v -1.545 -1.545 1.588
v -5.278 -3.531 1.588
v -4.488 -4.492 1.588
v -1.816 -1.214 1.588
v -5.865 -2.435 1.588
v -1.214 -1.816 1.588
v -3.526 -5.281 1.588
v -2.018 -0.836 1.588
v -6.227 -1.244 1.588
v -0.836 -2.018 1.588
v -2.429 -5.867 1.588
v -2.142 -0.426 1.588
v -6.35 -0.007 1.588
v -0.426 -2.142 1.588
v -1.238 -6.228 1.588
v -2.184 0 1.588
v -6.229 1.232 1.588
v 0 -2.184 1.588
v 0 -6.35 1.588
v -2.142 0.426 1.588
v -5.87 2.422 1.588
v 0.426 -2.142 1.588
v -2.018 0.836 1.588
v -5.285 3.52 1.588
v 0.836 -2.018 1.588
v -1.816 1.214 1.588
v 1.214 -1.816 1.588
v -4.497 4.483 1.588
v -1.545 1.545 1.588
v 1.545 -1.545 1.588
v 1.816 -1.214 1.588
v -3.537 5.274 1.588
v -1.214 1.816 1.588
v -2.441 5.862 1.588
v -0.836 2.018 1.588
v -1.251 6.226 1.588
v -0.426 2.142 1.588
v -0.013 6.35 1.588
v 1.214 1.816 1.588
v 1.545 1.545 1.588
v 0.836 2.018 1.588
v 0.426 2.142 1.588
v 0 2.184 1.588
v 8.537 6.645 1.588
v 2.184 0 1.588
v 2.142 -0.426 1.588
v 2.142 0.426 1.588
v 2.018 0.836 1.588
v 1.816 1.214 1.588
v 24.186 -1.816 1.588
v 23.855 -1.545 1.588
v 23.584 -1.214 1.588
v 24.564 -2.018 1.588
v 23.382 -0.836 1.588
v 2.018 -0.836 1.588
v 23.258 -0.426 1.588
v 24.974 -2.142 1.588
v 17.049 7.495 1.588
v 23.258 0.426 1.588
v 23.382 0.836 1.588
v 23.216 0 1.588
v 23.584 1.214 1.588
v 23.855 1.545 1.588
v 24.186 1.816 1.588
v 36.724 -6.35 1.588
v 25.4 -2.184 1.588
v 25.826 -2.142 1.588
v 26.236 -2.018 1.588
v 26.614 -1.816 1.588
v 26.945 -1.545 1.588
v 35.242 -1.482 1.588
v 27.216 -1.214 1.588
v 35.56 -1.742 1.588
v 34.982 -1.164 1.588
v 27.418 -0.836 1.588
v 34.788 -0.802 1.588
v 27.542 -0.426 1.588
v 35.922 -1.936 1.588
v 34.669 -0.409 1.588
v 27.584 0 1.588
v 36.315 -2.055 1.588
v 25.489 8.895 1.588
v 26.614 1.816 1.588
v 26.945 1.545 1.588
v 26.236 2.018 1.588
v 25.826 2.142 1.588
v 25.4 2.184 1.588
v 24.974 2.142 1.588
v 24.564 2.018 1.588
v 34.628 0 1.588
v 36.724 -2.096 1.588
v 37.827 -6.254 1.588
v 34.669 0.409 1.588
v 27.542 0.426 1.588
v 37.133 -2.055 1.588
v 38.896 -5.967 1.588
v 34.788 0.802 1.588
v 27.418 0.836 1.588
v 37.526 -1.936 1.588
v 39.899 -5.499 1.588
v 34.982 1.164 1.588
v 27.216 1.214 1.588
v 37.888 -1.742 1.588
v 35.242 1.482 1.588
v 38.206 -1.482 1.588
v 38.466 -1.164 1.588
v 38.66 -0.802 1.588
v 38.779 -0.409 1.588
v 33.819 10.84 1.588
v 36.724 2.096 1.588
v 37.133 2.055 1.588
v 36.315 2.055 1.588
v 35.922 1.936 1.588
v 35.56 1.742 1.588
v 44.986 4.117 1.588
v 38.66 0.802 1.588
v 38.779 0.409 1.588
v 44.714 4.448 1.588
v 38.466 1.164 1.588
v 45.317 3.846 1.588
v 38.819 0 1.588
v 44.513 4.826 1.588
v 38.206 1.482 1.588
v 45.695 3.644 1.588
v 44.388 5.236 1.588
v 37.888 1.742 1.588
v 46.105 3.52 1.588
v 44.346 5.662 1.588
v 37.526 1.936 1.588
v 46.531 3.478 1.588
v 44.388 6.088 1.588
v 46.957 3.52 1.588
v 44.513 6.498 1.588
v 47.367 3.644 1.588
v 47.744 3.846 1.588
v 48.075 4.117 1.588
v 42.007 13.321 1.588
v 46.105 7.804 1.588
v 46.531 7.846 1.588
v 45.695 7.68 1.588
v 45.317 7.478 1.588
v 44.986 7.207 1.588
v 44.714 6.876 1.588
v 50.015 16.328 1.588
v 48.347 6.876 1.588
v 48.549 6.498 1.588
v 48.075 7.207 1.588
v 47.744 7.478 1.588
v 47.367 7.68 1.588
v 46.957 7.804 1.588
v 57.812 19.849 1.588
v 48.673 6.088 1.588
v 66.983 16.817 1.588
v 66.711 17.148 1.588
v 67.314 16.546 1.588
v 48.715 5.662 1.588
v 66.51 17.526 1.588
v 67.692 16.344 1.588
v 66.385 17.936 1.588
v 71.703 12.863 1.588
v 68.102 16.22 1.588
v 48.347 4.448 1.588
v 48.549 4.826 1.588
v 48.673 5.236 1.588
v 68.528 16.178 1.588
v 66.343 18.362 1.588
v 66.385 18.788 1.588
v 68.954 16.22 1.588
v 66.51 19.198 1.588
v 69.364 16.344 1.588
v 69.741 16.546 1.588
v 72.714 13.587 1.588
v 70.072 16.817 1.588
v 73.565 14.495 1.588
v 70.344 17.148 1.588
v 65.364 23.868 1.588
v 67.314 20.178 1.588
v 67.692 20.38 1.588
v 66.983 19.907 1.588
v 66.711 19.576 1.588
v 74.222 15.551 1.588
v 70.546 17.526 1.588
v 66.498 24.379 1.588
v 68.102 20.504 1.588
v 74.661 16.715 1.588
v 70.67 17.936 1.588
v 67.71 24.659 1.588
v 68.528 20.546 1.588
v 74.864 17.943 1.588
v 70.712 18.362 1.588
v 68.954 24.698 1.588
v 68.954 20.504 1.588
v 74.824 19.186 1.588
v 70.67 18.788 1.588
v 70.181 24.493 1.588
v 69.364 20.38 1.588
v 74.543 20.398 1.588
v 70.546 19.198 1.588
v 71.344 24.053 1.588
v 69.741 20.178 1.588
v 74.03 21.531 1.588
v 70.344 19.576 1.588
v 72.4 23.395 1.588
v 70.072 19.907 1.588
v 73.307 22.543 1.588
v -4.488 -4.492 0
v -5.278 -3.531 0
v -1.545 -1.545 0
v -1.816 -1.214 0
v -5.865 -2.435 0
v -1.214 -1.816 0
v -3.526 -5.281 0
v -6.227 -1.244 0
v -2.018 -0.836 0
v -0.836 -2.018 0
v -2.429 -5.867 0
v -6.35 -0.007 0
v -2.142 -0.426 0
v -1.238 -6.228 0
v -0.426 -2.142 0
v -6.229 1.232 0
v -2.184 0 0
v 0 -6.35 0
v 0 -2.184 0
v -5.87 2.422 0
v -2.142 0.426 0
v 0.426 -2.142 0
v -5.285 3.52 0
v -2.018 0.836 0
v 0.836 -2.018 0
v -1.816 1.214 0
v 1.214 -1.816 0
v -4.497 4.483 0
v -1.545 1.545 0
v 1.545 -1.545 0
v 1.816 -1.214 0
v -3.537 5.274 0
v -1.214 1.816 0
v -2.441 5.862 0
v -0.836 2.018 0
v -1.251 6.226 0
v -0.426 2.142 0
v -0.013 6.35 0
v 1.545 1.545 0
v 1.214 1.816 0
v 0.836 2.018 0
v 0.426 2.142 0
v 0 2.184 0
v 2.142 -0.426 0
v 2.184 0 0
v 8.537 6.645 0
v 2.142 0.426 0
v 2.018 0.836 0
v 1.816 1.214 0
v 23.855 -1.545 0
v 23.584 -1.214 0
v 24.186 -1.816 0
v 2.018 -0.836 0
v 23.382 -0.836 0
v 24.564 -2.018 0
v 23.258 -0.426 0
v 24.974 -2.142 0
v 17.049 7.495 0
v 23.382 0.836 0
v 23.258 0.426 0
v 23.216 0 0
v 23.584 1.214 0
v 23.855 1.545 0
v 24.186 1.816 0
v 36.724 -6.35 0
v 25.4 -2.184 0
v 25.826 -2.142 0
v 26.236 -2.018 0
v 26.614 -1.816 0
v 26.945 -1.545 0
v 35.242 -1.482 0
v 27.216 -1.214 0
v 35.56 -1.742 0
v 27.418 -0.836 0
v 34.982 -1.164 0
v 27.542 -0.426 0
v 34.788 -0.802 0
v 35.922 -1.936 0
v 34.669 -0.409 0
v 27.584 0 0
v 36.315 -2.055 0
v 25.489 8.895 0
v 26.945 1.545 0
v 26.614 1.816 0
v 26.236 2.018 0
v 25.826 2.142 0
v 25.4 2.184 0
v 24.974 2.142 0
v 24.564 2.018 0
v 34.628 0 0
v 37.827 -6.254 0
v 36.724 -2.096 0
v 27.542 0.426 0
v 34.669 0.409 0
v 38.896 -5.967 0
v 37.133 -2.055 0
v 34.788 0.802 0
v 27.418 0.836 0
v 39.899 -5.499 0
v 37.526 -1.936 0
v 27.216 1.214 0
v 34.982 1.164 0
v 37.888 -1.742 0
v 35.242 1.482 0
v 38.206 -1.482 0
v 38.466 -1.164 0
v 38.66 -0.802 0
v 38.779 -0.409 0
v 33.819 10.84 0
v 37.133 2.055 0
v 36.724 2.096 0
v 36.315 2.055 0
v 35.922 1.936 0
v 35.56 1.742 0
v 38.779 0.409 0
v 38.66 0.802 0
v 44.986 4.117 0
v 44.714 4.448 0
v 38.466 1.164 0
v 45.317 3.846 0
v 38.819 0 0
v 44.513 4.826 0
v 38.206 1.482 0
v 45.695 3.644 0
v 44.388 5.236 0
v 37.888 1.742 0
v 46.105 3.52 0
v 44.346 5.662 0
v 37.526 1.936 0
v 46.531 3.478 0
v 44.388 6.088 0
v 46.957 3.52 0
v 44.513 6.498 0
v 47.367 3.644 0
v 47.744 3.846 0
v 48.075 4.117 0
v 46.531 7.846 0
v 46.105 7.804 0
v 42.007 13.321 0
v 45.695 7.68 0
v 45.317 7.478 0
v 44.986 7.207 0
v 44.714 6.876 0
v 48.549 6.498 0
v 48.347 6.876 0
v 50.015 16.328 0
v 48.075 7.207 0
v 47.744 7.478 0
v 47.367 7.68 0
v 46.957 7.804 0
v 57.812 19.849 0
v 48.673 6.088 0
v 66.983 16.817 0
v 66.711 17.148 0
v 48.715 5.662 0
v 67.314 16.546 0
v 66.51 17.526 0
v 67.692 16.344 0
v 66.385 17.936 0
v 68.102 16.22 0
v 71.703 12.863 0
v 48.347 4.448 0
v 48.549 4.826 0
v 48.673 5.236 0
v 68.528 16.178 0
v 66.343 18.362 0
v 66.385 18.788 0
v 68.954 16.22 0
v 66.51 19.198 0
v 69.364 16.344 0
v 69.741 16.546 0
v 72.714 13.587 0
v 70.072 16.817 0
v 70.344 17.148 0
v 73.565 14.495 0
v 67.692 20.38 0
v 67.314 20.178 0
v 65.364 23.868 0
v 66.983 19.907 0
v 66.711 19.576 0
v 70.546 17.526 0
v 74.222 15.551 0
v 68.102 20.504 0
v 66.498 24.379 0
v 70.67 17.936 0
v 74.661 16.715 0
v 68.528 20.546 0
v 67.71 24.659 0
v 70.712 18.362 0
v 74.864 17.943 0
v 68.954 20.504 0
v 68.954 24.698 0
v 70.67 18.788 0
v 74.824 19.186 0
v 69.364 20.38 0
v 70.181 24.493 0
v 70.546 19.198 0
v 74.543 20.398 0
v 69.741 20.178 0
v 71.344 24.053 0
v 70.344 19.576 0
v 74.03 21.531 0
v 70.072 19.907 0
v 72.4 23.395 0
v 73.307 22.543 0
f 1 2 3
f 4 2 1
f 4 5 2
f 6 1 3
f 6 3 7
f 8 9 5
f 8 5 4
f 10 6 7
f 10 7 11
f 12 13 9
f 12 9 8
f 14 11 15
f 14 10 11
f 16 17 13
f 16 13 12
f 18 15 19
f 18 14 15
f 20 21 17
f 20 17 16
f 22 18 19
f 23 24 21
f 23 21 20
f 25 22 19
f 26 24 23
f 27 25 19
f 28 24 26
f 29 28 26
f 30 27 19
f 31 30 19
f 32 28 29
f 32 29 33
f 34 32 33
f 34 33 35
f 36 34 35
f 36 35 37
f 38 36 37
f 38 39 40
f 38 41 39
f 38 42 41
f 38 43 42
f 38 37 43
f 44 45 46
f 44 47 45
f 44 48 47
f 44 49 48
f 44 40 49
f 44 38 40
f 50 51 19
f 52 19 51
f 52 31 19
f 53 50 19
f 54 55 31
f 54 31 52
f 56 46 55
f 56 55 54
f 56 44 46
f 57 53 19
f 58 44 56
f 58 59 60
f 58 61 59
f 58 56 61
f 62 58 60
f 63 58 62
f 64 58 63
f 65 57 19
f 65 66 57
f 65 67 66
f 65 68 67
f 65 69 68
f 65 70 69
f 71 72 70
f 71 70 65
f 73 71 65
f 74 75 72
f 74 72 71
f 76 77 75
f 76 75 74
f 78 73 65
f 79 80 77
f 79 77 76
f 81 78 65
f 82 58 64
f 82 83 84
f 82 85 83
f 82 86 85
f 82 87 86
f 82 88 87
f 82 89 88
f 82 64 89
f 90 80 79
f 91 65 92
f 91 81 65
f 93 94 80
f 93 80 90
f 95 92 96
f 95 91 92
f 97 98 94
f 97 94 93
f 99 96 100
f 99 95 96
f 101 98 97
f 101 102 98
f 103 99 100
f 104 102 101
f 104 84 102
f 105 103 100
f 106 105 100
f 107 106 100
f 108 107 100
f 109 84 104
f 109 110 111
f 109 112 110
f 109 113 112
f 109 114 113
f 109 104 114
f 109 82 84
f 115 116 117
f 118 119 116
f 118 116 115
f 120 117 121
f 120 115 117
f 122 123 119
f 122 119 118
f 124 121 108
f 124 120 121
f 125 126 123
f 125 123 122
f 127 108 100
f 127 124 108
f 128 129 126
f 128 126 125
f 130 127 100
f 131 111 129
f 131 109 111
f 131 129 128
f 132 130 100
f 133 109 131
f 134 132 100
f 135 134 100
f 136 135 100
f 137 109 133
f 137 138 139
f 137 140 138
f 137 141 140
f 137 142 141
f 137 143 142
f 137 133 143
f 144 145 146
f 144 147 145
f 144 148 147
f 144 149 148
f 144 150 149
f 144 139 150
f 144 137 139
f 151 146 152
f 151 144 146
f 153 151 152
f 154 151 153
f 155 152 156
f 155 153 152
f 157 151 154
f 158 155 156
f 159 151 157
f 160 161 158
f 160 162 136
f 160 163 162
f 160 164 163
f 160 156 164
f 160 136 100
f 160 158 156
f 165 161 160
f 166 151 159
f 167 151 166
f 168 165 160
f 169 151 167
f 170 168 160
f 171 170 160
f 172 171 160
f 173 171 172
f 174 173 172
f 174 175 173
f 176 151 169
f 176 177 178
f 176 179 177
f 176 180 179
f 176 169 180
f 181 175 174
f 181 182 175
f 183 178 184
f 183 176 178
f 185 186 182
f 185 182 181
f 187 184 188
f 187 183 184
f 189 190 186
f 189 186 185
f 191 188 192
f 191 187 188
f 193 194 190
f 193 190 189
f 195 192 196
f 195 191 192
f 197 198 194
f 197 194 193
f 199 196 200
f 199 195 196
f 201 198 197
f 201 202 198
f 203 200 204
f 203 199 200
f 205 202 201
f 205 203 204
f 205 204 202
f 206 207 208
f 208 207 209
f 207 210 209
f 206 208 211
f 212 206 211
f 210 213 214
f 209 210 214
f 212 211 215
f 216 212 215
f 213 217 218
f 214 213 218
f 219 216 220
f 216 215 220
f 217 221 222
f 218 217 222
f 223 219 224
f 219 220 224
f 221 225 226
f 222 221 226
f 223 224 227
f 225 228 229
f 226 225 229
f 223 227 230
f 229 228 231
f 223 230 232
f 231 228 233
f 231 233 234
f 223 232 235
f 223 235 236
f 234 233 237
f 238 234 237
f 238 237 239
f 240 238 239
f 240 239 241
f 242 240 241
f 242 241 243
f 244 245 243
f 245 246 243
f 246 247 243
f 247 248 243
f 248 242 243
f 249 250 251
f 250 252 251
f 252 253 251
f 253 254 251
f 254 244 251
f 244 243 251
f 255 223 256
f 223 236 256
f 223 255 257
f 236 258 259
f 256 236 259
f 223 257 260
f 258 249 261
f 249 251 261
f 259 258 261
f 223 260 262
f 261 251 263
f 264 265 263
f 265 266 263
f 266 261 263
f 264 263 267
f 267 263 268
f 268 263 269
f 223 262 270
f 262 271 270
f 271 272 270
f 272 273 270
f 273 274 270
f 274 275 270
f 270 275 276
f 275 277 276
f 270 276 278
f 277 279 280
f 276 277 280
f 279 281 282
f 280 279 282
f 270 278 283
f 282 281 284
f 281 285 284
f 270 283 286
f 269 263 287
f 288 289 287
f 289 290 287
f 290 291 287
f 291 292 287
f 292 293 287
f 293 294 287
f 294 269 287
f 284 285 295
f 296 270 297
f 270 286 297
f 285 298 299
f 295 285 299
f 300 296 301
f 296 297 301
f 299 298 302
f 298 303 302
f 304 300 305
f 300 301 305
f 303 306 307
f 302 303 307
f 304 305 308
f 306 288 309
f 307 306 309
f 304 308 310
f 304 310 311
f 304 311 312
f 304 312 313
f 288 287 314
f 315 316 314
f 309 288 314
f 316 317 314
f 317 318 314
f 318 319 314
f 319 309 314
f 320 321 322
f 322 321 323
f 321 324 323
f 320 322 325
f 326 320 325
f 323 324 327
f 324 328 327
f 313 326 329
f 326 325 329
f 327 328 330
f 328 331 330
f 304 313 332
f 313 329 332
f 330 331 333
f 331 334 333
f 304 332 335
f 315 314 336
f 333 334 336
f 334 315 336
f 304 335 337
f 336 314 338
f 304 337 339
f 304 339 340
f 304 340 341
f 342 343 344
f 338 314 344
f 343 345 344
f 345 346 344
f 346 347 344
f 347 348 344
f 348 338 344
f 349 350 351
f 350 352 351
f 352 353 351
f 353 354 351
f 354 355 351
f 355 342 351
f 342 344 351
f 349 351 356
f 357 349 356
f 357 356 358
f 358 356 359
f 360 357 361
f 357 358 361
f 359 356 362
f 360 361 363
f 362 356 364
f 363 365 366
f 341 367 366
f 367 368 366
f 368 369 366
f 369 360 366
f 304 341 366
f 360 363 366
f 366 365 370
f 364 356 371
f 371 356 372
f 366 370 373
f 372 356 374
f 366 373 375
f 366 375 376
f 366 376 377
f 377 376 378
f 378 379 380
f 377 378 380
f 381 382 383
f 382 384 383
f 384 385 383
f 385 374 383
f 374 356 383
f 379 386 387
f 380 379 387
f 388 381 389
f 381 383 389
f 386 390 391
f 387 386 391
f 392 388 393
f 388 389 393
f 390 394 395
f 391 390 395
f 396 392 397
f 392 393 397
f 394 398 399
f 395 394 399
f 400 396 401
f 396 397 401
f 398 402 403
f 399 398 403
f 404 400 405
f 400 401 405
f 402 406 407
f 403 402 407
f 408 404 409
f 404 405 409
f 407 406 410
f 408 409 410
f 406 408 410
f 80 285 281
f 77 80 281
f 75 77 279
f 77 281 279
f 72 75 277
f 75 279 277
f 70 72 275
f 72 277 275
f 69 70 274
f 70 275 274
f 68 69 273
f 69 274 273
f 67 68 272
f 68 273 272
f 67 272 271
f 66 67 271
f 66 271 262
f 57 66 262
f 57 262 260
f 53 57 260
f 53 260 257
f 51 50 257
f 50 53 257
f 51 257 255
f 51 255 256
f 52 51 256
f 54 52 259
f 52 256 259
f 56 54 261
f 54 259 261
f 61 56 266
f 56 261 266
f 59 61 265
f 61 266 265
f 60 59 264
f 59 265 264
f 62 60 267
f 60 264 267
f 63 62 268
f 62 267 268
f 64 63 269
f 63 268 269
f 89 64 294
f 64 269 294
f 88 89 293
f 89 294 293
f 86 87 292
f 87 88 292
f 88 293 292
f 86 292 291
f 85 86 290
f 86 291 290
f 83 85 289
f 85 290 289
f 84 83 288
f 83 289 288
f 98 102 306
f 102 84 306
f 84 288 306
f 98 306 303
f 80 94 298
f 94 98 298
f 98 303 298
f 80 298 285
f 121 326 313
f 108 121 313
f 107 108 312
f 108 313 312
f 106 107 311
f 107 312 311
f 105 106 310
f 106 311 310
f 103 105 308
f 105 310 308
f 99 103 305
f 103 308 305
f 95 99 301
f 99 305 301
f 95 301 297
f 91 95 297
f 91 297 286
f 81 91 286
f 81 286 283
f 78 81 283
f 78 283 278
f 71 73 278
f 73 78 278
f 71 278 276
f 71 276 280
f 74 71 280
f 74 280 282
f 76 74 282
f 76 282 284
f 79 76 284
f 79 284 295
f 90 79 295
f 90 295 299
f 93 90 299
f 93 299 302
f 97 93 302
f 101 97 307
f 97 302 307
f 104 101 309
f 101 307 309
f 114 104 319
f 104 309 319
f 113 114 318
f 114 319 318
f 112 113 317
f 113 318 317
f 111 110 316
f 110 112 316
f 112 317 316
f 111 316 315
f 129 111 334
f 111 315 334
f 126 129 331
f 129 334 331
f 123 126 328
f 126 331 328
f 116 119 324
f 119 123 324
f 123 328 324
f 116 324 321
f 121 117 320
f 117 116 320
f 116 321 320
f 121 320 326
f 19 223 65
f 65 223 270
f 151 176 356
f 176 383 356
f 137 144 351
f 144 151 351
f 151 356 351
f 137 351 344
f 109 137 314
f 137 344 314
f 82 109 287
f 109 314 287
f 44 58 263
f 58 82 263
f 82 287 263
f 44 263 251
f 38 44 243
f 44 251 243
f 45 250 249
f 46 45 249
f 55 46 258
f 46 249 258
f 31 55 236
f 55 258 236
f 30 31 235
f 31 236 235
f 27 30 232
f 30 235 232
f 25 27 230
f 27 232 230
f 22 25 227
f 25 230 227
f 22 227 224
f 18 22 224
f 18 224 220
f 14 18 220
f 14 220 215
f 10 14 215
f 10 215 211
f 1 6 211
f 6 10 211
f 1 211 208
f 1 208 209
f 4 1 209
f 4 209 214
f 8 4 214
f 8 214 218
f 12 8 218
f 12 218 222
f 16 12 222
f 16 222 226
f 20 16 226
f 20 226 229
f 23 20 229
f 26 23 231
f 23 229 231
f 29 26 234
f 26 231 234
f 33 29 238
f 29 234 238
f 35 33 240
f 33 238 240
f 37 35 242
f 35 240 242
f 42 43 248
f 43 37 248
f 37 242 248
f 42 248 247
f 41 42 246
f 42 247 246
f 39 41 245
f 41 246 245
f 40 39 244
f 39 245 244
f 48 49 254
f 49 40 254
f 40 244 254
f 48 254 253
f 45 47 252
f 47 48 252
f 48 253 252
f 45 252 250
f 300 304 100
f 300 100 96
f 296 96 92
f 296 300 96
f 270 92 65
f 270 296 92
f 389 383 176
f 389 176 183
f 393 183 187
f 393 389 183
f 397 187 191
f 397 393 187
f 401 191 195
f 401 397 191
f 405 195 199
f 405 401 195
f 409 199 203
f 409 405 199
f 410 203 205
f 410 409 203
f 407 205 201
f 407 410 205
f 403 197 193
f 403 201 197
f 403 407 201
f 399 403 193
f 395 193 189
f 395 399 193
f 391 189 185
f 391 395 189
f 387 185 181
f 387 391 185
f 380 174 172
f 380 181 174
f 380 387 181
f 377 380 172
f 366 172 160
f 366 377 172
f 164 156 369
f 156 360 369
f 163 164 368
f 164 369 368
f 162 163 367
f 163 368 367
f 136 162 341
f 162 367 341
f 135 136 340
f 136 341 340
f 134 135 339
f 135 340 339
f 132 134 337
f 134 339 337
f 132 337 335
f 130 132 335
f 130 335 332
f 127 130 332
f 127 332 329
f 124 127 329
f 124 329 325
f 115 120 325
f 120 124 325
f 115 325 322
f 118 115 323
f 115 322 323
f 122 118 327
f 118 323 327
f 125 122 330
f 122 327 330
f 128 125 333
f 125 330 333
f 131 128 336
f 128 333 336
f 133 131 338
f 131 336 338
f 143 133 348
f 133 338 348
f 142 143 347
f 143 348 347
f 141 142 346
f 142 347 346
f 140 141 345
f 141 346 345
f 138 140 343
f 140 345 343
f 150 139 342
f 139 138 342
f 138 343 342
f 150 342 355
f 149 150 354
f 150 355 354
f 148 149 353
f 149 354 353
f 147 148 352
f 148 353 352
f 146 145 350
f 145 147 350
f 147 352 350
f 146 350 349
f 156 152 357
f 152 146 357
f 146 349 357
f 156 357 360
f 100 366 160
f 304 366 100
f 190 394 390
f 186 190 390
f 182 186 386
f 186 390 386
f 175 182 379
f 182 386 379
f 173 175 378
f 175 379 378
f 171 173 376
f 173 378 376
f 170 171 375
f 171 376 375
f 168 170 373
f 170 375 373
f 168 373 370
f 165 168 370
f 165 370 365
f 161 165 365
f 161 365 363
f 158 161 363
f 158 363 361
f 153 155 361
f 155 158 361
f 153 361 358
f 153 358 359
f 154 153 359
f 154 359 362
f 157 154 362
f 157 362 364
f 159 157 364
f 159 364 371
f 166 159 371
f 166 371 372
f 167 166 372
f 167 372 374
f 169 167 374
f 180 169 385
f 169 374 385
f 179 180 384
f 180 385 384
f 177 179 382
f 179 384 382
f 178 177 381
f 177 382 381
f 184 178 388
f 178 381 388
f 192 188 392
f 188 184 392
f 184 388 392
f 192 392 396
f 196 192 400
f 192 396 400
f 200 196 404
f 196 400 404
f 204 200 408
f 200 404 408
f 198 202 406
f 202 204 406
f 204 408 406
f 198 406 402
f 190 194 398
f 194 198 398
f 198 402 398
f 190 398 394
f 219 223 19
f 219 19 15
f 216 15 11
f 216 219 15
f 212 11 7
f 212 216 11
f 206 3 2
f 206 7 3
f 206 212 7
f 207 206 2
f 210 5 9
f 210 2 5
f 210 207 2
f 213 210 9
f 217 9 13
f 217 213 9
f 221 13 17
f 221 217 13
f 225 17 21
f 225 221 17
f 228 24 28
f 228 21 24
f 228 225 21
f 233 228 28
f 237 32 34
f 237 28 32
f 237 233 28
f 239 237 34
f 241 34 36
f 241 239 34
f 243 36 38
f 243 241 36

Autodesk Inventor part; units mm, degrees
ref_plane "YZ Plane" through (0, 0, 0) normal (1, 0, 0) x (0, 1, 0)
ref_plane "XZ Plane" through (0, 0, 0) normal (0, 1, 0) x (-1, 0, 0)
ref_plane "XY Plane" through (0, 0, 0) normal (0, 0, 1) x (1, 0, 0)
sketch "main" plane through (0, 0, 0) normal (0, 0, 1) x (1, 0, 0)
  circle A0 centre (-6.1105, -12.0036) radius 2.1844
  circle A1 centre (-31.5105, -12.0036) radius 2.1844
  circle A2 centre (15.0202, -6.3416) radius 2.1844
  circle A3 centre (37.0172, 6.3584) radius 2.1844
  arc A4 (-31.5236, -5.6536) -> (-31.5105, -18.3536) centre (-31.5105, -12.0036) ccw
  arc A5 (40.1922, 0.8591) -> (33.8536, 11.8642) centre (37.0172, 6.3584) ccw
  arc A6 (-31.5236, -5.6536) -> (33.8536, 11.8642) centre (-31.796, 126.1175) ccw
  line L0 (-31.5105, -18.3536) -> (5.2134, -18.3536)
  line L1 (40.1922, 0.8591) -> (8.3884, -17.5028)
  circle A7 centre (5.2134, -12.0036) radius 2.0955
  arc A8 (5.2134, -18.3536) -> (8.3884, -17.5028) centre (5.2134, -12.0036) ccw
  line L2 (5.2134, -12.0036) -> (43.3134, -12.0036) construction
  point P0 (-0.7926, -1.6009)
  dimension "d0" = 12.7
  dimension "d3" = 12.7
  dimension "d7" = 4.191
  dimension "d8" = 6.35
  dimension "d13" = 25.4
sketch "Sketch1" plane through (0, 0, 0) normal (0, 0, 1) x (1, 0, 0)
  circle A0 centre (25.4, 0) radius 2.1844
  circle A1 centre (0, 0) radius 2.1844
  circle A2 centre (46.5307, 5.662) radius 2.1844
  circle A3 centre (68.5277, 18.362) radius 2.1844
  arc A4 (-0.0131, 6.35) -> (0, -6.35) centre (0, 0) ccw
  arc A5 (71.7027, 12.8627) -> (65.3641, 23.8678) centre (68.5277, 18.362) ccw
  arc A6 (-0.0131, 6.35) -> (65.3641, 23.8678) centre (-0.2855, 138.1211) ccw
  line L0 (0, -6.35) -> (36.7239, -6.35)
  line L1 (71.7027, 12.8627) -> (39.8989, -5.4993)
  circle A7 centre (36.7239, 0) radius 2.0955
  arc A8 (36.7239, -6.35) -> (39.8989, -5.4993) centre (36.7239, 0) ccw
  line L2 (36.7239, 0) -> (74.8239, 0) construction
extrude "Extrusion1" add sketch "Sketch1" along normal blind 1.5875
properties part number "60 Degree Gusset" material "Acetal Resin, White"
